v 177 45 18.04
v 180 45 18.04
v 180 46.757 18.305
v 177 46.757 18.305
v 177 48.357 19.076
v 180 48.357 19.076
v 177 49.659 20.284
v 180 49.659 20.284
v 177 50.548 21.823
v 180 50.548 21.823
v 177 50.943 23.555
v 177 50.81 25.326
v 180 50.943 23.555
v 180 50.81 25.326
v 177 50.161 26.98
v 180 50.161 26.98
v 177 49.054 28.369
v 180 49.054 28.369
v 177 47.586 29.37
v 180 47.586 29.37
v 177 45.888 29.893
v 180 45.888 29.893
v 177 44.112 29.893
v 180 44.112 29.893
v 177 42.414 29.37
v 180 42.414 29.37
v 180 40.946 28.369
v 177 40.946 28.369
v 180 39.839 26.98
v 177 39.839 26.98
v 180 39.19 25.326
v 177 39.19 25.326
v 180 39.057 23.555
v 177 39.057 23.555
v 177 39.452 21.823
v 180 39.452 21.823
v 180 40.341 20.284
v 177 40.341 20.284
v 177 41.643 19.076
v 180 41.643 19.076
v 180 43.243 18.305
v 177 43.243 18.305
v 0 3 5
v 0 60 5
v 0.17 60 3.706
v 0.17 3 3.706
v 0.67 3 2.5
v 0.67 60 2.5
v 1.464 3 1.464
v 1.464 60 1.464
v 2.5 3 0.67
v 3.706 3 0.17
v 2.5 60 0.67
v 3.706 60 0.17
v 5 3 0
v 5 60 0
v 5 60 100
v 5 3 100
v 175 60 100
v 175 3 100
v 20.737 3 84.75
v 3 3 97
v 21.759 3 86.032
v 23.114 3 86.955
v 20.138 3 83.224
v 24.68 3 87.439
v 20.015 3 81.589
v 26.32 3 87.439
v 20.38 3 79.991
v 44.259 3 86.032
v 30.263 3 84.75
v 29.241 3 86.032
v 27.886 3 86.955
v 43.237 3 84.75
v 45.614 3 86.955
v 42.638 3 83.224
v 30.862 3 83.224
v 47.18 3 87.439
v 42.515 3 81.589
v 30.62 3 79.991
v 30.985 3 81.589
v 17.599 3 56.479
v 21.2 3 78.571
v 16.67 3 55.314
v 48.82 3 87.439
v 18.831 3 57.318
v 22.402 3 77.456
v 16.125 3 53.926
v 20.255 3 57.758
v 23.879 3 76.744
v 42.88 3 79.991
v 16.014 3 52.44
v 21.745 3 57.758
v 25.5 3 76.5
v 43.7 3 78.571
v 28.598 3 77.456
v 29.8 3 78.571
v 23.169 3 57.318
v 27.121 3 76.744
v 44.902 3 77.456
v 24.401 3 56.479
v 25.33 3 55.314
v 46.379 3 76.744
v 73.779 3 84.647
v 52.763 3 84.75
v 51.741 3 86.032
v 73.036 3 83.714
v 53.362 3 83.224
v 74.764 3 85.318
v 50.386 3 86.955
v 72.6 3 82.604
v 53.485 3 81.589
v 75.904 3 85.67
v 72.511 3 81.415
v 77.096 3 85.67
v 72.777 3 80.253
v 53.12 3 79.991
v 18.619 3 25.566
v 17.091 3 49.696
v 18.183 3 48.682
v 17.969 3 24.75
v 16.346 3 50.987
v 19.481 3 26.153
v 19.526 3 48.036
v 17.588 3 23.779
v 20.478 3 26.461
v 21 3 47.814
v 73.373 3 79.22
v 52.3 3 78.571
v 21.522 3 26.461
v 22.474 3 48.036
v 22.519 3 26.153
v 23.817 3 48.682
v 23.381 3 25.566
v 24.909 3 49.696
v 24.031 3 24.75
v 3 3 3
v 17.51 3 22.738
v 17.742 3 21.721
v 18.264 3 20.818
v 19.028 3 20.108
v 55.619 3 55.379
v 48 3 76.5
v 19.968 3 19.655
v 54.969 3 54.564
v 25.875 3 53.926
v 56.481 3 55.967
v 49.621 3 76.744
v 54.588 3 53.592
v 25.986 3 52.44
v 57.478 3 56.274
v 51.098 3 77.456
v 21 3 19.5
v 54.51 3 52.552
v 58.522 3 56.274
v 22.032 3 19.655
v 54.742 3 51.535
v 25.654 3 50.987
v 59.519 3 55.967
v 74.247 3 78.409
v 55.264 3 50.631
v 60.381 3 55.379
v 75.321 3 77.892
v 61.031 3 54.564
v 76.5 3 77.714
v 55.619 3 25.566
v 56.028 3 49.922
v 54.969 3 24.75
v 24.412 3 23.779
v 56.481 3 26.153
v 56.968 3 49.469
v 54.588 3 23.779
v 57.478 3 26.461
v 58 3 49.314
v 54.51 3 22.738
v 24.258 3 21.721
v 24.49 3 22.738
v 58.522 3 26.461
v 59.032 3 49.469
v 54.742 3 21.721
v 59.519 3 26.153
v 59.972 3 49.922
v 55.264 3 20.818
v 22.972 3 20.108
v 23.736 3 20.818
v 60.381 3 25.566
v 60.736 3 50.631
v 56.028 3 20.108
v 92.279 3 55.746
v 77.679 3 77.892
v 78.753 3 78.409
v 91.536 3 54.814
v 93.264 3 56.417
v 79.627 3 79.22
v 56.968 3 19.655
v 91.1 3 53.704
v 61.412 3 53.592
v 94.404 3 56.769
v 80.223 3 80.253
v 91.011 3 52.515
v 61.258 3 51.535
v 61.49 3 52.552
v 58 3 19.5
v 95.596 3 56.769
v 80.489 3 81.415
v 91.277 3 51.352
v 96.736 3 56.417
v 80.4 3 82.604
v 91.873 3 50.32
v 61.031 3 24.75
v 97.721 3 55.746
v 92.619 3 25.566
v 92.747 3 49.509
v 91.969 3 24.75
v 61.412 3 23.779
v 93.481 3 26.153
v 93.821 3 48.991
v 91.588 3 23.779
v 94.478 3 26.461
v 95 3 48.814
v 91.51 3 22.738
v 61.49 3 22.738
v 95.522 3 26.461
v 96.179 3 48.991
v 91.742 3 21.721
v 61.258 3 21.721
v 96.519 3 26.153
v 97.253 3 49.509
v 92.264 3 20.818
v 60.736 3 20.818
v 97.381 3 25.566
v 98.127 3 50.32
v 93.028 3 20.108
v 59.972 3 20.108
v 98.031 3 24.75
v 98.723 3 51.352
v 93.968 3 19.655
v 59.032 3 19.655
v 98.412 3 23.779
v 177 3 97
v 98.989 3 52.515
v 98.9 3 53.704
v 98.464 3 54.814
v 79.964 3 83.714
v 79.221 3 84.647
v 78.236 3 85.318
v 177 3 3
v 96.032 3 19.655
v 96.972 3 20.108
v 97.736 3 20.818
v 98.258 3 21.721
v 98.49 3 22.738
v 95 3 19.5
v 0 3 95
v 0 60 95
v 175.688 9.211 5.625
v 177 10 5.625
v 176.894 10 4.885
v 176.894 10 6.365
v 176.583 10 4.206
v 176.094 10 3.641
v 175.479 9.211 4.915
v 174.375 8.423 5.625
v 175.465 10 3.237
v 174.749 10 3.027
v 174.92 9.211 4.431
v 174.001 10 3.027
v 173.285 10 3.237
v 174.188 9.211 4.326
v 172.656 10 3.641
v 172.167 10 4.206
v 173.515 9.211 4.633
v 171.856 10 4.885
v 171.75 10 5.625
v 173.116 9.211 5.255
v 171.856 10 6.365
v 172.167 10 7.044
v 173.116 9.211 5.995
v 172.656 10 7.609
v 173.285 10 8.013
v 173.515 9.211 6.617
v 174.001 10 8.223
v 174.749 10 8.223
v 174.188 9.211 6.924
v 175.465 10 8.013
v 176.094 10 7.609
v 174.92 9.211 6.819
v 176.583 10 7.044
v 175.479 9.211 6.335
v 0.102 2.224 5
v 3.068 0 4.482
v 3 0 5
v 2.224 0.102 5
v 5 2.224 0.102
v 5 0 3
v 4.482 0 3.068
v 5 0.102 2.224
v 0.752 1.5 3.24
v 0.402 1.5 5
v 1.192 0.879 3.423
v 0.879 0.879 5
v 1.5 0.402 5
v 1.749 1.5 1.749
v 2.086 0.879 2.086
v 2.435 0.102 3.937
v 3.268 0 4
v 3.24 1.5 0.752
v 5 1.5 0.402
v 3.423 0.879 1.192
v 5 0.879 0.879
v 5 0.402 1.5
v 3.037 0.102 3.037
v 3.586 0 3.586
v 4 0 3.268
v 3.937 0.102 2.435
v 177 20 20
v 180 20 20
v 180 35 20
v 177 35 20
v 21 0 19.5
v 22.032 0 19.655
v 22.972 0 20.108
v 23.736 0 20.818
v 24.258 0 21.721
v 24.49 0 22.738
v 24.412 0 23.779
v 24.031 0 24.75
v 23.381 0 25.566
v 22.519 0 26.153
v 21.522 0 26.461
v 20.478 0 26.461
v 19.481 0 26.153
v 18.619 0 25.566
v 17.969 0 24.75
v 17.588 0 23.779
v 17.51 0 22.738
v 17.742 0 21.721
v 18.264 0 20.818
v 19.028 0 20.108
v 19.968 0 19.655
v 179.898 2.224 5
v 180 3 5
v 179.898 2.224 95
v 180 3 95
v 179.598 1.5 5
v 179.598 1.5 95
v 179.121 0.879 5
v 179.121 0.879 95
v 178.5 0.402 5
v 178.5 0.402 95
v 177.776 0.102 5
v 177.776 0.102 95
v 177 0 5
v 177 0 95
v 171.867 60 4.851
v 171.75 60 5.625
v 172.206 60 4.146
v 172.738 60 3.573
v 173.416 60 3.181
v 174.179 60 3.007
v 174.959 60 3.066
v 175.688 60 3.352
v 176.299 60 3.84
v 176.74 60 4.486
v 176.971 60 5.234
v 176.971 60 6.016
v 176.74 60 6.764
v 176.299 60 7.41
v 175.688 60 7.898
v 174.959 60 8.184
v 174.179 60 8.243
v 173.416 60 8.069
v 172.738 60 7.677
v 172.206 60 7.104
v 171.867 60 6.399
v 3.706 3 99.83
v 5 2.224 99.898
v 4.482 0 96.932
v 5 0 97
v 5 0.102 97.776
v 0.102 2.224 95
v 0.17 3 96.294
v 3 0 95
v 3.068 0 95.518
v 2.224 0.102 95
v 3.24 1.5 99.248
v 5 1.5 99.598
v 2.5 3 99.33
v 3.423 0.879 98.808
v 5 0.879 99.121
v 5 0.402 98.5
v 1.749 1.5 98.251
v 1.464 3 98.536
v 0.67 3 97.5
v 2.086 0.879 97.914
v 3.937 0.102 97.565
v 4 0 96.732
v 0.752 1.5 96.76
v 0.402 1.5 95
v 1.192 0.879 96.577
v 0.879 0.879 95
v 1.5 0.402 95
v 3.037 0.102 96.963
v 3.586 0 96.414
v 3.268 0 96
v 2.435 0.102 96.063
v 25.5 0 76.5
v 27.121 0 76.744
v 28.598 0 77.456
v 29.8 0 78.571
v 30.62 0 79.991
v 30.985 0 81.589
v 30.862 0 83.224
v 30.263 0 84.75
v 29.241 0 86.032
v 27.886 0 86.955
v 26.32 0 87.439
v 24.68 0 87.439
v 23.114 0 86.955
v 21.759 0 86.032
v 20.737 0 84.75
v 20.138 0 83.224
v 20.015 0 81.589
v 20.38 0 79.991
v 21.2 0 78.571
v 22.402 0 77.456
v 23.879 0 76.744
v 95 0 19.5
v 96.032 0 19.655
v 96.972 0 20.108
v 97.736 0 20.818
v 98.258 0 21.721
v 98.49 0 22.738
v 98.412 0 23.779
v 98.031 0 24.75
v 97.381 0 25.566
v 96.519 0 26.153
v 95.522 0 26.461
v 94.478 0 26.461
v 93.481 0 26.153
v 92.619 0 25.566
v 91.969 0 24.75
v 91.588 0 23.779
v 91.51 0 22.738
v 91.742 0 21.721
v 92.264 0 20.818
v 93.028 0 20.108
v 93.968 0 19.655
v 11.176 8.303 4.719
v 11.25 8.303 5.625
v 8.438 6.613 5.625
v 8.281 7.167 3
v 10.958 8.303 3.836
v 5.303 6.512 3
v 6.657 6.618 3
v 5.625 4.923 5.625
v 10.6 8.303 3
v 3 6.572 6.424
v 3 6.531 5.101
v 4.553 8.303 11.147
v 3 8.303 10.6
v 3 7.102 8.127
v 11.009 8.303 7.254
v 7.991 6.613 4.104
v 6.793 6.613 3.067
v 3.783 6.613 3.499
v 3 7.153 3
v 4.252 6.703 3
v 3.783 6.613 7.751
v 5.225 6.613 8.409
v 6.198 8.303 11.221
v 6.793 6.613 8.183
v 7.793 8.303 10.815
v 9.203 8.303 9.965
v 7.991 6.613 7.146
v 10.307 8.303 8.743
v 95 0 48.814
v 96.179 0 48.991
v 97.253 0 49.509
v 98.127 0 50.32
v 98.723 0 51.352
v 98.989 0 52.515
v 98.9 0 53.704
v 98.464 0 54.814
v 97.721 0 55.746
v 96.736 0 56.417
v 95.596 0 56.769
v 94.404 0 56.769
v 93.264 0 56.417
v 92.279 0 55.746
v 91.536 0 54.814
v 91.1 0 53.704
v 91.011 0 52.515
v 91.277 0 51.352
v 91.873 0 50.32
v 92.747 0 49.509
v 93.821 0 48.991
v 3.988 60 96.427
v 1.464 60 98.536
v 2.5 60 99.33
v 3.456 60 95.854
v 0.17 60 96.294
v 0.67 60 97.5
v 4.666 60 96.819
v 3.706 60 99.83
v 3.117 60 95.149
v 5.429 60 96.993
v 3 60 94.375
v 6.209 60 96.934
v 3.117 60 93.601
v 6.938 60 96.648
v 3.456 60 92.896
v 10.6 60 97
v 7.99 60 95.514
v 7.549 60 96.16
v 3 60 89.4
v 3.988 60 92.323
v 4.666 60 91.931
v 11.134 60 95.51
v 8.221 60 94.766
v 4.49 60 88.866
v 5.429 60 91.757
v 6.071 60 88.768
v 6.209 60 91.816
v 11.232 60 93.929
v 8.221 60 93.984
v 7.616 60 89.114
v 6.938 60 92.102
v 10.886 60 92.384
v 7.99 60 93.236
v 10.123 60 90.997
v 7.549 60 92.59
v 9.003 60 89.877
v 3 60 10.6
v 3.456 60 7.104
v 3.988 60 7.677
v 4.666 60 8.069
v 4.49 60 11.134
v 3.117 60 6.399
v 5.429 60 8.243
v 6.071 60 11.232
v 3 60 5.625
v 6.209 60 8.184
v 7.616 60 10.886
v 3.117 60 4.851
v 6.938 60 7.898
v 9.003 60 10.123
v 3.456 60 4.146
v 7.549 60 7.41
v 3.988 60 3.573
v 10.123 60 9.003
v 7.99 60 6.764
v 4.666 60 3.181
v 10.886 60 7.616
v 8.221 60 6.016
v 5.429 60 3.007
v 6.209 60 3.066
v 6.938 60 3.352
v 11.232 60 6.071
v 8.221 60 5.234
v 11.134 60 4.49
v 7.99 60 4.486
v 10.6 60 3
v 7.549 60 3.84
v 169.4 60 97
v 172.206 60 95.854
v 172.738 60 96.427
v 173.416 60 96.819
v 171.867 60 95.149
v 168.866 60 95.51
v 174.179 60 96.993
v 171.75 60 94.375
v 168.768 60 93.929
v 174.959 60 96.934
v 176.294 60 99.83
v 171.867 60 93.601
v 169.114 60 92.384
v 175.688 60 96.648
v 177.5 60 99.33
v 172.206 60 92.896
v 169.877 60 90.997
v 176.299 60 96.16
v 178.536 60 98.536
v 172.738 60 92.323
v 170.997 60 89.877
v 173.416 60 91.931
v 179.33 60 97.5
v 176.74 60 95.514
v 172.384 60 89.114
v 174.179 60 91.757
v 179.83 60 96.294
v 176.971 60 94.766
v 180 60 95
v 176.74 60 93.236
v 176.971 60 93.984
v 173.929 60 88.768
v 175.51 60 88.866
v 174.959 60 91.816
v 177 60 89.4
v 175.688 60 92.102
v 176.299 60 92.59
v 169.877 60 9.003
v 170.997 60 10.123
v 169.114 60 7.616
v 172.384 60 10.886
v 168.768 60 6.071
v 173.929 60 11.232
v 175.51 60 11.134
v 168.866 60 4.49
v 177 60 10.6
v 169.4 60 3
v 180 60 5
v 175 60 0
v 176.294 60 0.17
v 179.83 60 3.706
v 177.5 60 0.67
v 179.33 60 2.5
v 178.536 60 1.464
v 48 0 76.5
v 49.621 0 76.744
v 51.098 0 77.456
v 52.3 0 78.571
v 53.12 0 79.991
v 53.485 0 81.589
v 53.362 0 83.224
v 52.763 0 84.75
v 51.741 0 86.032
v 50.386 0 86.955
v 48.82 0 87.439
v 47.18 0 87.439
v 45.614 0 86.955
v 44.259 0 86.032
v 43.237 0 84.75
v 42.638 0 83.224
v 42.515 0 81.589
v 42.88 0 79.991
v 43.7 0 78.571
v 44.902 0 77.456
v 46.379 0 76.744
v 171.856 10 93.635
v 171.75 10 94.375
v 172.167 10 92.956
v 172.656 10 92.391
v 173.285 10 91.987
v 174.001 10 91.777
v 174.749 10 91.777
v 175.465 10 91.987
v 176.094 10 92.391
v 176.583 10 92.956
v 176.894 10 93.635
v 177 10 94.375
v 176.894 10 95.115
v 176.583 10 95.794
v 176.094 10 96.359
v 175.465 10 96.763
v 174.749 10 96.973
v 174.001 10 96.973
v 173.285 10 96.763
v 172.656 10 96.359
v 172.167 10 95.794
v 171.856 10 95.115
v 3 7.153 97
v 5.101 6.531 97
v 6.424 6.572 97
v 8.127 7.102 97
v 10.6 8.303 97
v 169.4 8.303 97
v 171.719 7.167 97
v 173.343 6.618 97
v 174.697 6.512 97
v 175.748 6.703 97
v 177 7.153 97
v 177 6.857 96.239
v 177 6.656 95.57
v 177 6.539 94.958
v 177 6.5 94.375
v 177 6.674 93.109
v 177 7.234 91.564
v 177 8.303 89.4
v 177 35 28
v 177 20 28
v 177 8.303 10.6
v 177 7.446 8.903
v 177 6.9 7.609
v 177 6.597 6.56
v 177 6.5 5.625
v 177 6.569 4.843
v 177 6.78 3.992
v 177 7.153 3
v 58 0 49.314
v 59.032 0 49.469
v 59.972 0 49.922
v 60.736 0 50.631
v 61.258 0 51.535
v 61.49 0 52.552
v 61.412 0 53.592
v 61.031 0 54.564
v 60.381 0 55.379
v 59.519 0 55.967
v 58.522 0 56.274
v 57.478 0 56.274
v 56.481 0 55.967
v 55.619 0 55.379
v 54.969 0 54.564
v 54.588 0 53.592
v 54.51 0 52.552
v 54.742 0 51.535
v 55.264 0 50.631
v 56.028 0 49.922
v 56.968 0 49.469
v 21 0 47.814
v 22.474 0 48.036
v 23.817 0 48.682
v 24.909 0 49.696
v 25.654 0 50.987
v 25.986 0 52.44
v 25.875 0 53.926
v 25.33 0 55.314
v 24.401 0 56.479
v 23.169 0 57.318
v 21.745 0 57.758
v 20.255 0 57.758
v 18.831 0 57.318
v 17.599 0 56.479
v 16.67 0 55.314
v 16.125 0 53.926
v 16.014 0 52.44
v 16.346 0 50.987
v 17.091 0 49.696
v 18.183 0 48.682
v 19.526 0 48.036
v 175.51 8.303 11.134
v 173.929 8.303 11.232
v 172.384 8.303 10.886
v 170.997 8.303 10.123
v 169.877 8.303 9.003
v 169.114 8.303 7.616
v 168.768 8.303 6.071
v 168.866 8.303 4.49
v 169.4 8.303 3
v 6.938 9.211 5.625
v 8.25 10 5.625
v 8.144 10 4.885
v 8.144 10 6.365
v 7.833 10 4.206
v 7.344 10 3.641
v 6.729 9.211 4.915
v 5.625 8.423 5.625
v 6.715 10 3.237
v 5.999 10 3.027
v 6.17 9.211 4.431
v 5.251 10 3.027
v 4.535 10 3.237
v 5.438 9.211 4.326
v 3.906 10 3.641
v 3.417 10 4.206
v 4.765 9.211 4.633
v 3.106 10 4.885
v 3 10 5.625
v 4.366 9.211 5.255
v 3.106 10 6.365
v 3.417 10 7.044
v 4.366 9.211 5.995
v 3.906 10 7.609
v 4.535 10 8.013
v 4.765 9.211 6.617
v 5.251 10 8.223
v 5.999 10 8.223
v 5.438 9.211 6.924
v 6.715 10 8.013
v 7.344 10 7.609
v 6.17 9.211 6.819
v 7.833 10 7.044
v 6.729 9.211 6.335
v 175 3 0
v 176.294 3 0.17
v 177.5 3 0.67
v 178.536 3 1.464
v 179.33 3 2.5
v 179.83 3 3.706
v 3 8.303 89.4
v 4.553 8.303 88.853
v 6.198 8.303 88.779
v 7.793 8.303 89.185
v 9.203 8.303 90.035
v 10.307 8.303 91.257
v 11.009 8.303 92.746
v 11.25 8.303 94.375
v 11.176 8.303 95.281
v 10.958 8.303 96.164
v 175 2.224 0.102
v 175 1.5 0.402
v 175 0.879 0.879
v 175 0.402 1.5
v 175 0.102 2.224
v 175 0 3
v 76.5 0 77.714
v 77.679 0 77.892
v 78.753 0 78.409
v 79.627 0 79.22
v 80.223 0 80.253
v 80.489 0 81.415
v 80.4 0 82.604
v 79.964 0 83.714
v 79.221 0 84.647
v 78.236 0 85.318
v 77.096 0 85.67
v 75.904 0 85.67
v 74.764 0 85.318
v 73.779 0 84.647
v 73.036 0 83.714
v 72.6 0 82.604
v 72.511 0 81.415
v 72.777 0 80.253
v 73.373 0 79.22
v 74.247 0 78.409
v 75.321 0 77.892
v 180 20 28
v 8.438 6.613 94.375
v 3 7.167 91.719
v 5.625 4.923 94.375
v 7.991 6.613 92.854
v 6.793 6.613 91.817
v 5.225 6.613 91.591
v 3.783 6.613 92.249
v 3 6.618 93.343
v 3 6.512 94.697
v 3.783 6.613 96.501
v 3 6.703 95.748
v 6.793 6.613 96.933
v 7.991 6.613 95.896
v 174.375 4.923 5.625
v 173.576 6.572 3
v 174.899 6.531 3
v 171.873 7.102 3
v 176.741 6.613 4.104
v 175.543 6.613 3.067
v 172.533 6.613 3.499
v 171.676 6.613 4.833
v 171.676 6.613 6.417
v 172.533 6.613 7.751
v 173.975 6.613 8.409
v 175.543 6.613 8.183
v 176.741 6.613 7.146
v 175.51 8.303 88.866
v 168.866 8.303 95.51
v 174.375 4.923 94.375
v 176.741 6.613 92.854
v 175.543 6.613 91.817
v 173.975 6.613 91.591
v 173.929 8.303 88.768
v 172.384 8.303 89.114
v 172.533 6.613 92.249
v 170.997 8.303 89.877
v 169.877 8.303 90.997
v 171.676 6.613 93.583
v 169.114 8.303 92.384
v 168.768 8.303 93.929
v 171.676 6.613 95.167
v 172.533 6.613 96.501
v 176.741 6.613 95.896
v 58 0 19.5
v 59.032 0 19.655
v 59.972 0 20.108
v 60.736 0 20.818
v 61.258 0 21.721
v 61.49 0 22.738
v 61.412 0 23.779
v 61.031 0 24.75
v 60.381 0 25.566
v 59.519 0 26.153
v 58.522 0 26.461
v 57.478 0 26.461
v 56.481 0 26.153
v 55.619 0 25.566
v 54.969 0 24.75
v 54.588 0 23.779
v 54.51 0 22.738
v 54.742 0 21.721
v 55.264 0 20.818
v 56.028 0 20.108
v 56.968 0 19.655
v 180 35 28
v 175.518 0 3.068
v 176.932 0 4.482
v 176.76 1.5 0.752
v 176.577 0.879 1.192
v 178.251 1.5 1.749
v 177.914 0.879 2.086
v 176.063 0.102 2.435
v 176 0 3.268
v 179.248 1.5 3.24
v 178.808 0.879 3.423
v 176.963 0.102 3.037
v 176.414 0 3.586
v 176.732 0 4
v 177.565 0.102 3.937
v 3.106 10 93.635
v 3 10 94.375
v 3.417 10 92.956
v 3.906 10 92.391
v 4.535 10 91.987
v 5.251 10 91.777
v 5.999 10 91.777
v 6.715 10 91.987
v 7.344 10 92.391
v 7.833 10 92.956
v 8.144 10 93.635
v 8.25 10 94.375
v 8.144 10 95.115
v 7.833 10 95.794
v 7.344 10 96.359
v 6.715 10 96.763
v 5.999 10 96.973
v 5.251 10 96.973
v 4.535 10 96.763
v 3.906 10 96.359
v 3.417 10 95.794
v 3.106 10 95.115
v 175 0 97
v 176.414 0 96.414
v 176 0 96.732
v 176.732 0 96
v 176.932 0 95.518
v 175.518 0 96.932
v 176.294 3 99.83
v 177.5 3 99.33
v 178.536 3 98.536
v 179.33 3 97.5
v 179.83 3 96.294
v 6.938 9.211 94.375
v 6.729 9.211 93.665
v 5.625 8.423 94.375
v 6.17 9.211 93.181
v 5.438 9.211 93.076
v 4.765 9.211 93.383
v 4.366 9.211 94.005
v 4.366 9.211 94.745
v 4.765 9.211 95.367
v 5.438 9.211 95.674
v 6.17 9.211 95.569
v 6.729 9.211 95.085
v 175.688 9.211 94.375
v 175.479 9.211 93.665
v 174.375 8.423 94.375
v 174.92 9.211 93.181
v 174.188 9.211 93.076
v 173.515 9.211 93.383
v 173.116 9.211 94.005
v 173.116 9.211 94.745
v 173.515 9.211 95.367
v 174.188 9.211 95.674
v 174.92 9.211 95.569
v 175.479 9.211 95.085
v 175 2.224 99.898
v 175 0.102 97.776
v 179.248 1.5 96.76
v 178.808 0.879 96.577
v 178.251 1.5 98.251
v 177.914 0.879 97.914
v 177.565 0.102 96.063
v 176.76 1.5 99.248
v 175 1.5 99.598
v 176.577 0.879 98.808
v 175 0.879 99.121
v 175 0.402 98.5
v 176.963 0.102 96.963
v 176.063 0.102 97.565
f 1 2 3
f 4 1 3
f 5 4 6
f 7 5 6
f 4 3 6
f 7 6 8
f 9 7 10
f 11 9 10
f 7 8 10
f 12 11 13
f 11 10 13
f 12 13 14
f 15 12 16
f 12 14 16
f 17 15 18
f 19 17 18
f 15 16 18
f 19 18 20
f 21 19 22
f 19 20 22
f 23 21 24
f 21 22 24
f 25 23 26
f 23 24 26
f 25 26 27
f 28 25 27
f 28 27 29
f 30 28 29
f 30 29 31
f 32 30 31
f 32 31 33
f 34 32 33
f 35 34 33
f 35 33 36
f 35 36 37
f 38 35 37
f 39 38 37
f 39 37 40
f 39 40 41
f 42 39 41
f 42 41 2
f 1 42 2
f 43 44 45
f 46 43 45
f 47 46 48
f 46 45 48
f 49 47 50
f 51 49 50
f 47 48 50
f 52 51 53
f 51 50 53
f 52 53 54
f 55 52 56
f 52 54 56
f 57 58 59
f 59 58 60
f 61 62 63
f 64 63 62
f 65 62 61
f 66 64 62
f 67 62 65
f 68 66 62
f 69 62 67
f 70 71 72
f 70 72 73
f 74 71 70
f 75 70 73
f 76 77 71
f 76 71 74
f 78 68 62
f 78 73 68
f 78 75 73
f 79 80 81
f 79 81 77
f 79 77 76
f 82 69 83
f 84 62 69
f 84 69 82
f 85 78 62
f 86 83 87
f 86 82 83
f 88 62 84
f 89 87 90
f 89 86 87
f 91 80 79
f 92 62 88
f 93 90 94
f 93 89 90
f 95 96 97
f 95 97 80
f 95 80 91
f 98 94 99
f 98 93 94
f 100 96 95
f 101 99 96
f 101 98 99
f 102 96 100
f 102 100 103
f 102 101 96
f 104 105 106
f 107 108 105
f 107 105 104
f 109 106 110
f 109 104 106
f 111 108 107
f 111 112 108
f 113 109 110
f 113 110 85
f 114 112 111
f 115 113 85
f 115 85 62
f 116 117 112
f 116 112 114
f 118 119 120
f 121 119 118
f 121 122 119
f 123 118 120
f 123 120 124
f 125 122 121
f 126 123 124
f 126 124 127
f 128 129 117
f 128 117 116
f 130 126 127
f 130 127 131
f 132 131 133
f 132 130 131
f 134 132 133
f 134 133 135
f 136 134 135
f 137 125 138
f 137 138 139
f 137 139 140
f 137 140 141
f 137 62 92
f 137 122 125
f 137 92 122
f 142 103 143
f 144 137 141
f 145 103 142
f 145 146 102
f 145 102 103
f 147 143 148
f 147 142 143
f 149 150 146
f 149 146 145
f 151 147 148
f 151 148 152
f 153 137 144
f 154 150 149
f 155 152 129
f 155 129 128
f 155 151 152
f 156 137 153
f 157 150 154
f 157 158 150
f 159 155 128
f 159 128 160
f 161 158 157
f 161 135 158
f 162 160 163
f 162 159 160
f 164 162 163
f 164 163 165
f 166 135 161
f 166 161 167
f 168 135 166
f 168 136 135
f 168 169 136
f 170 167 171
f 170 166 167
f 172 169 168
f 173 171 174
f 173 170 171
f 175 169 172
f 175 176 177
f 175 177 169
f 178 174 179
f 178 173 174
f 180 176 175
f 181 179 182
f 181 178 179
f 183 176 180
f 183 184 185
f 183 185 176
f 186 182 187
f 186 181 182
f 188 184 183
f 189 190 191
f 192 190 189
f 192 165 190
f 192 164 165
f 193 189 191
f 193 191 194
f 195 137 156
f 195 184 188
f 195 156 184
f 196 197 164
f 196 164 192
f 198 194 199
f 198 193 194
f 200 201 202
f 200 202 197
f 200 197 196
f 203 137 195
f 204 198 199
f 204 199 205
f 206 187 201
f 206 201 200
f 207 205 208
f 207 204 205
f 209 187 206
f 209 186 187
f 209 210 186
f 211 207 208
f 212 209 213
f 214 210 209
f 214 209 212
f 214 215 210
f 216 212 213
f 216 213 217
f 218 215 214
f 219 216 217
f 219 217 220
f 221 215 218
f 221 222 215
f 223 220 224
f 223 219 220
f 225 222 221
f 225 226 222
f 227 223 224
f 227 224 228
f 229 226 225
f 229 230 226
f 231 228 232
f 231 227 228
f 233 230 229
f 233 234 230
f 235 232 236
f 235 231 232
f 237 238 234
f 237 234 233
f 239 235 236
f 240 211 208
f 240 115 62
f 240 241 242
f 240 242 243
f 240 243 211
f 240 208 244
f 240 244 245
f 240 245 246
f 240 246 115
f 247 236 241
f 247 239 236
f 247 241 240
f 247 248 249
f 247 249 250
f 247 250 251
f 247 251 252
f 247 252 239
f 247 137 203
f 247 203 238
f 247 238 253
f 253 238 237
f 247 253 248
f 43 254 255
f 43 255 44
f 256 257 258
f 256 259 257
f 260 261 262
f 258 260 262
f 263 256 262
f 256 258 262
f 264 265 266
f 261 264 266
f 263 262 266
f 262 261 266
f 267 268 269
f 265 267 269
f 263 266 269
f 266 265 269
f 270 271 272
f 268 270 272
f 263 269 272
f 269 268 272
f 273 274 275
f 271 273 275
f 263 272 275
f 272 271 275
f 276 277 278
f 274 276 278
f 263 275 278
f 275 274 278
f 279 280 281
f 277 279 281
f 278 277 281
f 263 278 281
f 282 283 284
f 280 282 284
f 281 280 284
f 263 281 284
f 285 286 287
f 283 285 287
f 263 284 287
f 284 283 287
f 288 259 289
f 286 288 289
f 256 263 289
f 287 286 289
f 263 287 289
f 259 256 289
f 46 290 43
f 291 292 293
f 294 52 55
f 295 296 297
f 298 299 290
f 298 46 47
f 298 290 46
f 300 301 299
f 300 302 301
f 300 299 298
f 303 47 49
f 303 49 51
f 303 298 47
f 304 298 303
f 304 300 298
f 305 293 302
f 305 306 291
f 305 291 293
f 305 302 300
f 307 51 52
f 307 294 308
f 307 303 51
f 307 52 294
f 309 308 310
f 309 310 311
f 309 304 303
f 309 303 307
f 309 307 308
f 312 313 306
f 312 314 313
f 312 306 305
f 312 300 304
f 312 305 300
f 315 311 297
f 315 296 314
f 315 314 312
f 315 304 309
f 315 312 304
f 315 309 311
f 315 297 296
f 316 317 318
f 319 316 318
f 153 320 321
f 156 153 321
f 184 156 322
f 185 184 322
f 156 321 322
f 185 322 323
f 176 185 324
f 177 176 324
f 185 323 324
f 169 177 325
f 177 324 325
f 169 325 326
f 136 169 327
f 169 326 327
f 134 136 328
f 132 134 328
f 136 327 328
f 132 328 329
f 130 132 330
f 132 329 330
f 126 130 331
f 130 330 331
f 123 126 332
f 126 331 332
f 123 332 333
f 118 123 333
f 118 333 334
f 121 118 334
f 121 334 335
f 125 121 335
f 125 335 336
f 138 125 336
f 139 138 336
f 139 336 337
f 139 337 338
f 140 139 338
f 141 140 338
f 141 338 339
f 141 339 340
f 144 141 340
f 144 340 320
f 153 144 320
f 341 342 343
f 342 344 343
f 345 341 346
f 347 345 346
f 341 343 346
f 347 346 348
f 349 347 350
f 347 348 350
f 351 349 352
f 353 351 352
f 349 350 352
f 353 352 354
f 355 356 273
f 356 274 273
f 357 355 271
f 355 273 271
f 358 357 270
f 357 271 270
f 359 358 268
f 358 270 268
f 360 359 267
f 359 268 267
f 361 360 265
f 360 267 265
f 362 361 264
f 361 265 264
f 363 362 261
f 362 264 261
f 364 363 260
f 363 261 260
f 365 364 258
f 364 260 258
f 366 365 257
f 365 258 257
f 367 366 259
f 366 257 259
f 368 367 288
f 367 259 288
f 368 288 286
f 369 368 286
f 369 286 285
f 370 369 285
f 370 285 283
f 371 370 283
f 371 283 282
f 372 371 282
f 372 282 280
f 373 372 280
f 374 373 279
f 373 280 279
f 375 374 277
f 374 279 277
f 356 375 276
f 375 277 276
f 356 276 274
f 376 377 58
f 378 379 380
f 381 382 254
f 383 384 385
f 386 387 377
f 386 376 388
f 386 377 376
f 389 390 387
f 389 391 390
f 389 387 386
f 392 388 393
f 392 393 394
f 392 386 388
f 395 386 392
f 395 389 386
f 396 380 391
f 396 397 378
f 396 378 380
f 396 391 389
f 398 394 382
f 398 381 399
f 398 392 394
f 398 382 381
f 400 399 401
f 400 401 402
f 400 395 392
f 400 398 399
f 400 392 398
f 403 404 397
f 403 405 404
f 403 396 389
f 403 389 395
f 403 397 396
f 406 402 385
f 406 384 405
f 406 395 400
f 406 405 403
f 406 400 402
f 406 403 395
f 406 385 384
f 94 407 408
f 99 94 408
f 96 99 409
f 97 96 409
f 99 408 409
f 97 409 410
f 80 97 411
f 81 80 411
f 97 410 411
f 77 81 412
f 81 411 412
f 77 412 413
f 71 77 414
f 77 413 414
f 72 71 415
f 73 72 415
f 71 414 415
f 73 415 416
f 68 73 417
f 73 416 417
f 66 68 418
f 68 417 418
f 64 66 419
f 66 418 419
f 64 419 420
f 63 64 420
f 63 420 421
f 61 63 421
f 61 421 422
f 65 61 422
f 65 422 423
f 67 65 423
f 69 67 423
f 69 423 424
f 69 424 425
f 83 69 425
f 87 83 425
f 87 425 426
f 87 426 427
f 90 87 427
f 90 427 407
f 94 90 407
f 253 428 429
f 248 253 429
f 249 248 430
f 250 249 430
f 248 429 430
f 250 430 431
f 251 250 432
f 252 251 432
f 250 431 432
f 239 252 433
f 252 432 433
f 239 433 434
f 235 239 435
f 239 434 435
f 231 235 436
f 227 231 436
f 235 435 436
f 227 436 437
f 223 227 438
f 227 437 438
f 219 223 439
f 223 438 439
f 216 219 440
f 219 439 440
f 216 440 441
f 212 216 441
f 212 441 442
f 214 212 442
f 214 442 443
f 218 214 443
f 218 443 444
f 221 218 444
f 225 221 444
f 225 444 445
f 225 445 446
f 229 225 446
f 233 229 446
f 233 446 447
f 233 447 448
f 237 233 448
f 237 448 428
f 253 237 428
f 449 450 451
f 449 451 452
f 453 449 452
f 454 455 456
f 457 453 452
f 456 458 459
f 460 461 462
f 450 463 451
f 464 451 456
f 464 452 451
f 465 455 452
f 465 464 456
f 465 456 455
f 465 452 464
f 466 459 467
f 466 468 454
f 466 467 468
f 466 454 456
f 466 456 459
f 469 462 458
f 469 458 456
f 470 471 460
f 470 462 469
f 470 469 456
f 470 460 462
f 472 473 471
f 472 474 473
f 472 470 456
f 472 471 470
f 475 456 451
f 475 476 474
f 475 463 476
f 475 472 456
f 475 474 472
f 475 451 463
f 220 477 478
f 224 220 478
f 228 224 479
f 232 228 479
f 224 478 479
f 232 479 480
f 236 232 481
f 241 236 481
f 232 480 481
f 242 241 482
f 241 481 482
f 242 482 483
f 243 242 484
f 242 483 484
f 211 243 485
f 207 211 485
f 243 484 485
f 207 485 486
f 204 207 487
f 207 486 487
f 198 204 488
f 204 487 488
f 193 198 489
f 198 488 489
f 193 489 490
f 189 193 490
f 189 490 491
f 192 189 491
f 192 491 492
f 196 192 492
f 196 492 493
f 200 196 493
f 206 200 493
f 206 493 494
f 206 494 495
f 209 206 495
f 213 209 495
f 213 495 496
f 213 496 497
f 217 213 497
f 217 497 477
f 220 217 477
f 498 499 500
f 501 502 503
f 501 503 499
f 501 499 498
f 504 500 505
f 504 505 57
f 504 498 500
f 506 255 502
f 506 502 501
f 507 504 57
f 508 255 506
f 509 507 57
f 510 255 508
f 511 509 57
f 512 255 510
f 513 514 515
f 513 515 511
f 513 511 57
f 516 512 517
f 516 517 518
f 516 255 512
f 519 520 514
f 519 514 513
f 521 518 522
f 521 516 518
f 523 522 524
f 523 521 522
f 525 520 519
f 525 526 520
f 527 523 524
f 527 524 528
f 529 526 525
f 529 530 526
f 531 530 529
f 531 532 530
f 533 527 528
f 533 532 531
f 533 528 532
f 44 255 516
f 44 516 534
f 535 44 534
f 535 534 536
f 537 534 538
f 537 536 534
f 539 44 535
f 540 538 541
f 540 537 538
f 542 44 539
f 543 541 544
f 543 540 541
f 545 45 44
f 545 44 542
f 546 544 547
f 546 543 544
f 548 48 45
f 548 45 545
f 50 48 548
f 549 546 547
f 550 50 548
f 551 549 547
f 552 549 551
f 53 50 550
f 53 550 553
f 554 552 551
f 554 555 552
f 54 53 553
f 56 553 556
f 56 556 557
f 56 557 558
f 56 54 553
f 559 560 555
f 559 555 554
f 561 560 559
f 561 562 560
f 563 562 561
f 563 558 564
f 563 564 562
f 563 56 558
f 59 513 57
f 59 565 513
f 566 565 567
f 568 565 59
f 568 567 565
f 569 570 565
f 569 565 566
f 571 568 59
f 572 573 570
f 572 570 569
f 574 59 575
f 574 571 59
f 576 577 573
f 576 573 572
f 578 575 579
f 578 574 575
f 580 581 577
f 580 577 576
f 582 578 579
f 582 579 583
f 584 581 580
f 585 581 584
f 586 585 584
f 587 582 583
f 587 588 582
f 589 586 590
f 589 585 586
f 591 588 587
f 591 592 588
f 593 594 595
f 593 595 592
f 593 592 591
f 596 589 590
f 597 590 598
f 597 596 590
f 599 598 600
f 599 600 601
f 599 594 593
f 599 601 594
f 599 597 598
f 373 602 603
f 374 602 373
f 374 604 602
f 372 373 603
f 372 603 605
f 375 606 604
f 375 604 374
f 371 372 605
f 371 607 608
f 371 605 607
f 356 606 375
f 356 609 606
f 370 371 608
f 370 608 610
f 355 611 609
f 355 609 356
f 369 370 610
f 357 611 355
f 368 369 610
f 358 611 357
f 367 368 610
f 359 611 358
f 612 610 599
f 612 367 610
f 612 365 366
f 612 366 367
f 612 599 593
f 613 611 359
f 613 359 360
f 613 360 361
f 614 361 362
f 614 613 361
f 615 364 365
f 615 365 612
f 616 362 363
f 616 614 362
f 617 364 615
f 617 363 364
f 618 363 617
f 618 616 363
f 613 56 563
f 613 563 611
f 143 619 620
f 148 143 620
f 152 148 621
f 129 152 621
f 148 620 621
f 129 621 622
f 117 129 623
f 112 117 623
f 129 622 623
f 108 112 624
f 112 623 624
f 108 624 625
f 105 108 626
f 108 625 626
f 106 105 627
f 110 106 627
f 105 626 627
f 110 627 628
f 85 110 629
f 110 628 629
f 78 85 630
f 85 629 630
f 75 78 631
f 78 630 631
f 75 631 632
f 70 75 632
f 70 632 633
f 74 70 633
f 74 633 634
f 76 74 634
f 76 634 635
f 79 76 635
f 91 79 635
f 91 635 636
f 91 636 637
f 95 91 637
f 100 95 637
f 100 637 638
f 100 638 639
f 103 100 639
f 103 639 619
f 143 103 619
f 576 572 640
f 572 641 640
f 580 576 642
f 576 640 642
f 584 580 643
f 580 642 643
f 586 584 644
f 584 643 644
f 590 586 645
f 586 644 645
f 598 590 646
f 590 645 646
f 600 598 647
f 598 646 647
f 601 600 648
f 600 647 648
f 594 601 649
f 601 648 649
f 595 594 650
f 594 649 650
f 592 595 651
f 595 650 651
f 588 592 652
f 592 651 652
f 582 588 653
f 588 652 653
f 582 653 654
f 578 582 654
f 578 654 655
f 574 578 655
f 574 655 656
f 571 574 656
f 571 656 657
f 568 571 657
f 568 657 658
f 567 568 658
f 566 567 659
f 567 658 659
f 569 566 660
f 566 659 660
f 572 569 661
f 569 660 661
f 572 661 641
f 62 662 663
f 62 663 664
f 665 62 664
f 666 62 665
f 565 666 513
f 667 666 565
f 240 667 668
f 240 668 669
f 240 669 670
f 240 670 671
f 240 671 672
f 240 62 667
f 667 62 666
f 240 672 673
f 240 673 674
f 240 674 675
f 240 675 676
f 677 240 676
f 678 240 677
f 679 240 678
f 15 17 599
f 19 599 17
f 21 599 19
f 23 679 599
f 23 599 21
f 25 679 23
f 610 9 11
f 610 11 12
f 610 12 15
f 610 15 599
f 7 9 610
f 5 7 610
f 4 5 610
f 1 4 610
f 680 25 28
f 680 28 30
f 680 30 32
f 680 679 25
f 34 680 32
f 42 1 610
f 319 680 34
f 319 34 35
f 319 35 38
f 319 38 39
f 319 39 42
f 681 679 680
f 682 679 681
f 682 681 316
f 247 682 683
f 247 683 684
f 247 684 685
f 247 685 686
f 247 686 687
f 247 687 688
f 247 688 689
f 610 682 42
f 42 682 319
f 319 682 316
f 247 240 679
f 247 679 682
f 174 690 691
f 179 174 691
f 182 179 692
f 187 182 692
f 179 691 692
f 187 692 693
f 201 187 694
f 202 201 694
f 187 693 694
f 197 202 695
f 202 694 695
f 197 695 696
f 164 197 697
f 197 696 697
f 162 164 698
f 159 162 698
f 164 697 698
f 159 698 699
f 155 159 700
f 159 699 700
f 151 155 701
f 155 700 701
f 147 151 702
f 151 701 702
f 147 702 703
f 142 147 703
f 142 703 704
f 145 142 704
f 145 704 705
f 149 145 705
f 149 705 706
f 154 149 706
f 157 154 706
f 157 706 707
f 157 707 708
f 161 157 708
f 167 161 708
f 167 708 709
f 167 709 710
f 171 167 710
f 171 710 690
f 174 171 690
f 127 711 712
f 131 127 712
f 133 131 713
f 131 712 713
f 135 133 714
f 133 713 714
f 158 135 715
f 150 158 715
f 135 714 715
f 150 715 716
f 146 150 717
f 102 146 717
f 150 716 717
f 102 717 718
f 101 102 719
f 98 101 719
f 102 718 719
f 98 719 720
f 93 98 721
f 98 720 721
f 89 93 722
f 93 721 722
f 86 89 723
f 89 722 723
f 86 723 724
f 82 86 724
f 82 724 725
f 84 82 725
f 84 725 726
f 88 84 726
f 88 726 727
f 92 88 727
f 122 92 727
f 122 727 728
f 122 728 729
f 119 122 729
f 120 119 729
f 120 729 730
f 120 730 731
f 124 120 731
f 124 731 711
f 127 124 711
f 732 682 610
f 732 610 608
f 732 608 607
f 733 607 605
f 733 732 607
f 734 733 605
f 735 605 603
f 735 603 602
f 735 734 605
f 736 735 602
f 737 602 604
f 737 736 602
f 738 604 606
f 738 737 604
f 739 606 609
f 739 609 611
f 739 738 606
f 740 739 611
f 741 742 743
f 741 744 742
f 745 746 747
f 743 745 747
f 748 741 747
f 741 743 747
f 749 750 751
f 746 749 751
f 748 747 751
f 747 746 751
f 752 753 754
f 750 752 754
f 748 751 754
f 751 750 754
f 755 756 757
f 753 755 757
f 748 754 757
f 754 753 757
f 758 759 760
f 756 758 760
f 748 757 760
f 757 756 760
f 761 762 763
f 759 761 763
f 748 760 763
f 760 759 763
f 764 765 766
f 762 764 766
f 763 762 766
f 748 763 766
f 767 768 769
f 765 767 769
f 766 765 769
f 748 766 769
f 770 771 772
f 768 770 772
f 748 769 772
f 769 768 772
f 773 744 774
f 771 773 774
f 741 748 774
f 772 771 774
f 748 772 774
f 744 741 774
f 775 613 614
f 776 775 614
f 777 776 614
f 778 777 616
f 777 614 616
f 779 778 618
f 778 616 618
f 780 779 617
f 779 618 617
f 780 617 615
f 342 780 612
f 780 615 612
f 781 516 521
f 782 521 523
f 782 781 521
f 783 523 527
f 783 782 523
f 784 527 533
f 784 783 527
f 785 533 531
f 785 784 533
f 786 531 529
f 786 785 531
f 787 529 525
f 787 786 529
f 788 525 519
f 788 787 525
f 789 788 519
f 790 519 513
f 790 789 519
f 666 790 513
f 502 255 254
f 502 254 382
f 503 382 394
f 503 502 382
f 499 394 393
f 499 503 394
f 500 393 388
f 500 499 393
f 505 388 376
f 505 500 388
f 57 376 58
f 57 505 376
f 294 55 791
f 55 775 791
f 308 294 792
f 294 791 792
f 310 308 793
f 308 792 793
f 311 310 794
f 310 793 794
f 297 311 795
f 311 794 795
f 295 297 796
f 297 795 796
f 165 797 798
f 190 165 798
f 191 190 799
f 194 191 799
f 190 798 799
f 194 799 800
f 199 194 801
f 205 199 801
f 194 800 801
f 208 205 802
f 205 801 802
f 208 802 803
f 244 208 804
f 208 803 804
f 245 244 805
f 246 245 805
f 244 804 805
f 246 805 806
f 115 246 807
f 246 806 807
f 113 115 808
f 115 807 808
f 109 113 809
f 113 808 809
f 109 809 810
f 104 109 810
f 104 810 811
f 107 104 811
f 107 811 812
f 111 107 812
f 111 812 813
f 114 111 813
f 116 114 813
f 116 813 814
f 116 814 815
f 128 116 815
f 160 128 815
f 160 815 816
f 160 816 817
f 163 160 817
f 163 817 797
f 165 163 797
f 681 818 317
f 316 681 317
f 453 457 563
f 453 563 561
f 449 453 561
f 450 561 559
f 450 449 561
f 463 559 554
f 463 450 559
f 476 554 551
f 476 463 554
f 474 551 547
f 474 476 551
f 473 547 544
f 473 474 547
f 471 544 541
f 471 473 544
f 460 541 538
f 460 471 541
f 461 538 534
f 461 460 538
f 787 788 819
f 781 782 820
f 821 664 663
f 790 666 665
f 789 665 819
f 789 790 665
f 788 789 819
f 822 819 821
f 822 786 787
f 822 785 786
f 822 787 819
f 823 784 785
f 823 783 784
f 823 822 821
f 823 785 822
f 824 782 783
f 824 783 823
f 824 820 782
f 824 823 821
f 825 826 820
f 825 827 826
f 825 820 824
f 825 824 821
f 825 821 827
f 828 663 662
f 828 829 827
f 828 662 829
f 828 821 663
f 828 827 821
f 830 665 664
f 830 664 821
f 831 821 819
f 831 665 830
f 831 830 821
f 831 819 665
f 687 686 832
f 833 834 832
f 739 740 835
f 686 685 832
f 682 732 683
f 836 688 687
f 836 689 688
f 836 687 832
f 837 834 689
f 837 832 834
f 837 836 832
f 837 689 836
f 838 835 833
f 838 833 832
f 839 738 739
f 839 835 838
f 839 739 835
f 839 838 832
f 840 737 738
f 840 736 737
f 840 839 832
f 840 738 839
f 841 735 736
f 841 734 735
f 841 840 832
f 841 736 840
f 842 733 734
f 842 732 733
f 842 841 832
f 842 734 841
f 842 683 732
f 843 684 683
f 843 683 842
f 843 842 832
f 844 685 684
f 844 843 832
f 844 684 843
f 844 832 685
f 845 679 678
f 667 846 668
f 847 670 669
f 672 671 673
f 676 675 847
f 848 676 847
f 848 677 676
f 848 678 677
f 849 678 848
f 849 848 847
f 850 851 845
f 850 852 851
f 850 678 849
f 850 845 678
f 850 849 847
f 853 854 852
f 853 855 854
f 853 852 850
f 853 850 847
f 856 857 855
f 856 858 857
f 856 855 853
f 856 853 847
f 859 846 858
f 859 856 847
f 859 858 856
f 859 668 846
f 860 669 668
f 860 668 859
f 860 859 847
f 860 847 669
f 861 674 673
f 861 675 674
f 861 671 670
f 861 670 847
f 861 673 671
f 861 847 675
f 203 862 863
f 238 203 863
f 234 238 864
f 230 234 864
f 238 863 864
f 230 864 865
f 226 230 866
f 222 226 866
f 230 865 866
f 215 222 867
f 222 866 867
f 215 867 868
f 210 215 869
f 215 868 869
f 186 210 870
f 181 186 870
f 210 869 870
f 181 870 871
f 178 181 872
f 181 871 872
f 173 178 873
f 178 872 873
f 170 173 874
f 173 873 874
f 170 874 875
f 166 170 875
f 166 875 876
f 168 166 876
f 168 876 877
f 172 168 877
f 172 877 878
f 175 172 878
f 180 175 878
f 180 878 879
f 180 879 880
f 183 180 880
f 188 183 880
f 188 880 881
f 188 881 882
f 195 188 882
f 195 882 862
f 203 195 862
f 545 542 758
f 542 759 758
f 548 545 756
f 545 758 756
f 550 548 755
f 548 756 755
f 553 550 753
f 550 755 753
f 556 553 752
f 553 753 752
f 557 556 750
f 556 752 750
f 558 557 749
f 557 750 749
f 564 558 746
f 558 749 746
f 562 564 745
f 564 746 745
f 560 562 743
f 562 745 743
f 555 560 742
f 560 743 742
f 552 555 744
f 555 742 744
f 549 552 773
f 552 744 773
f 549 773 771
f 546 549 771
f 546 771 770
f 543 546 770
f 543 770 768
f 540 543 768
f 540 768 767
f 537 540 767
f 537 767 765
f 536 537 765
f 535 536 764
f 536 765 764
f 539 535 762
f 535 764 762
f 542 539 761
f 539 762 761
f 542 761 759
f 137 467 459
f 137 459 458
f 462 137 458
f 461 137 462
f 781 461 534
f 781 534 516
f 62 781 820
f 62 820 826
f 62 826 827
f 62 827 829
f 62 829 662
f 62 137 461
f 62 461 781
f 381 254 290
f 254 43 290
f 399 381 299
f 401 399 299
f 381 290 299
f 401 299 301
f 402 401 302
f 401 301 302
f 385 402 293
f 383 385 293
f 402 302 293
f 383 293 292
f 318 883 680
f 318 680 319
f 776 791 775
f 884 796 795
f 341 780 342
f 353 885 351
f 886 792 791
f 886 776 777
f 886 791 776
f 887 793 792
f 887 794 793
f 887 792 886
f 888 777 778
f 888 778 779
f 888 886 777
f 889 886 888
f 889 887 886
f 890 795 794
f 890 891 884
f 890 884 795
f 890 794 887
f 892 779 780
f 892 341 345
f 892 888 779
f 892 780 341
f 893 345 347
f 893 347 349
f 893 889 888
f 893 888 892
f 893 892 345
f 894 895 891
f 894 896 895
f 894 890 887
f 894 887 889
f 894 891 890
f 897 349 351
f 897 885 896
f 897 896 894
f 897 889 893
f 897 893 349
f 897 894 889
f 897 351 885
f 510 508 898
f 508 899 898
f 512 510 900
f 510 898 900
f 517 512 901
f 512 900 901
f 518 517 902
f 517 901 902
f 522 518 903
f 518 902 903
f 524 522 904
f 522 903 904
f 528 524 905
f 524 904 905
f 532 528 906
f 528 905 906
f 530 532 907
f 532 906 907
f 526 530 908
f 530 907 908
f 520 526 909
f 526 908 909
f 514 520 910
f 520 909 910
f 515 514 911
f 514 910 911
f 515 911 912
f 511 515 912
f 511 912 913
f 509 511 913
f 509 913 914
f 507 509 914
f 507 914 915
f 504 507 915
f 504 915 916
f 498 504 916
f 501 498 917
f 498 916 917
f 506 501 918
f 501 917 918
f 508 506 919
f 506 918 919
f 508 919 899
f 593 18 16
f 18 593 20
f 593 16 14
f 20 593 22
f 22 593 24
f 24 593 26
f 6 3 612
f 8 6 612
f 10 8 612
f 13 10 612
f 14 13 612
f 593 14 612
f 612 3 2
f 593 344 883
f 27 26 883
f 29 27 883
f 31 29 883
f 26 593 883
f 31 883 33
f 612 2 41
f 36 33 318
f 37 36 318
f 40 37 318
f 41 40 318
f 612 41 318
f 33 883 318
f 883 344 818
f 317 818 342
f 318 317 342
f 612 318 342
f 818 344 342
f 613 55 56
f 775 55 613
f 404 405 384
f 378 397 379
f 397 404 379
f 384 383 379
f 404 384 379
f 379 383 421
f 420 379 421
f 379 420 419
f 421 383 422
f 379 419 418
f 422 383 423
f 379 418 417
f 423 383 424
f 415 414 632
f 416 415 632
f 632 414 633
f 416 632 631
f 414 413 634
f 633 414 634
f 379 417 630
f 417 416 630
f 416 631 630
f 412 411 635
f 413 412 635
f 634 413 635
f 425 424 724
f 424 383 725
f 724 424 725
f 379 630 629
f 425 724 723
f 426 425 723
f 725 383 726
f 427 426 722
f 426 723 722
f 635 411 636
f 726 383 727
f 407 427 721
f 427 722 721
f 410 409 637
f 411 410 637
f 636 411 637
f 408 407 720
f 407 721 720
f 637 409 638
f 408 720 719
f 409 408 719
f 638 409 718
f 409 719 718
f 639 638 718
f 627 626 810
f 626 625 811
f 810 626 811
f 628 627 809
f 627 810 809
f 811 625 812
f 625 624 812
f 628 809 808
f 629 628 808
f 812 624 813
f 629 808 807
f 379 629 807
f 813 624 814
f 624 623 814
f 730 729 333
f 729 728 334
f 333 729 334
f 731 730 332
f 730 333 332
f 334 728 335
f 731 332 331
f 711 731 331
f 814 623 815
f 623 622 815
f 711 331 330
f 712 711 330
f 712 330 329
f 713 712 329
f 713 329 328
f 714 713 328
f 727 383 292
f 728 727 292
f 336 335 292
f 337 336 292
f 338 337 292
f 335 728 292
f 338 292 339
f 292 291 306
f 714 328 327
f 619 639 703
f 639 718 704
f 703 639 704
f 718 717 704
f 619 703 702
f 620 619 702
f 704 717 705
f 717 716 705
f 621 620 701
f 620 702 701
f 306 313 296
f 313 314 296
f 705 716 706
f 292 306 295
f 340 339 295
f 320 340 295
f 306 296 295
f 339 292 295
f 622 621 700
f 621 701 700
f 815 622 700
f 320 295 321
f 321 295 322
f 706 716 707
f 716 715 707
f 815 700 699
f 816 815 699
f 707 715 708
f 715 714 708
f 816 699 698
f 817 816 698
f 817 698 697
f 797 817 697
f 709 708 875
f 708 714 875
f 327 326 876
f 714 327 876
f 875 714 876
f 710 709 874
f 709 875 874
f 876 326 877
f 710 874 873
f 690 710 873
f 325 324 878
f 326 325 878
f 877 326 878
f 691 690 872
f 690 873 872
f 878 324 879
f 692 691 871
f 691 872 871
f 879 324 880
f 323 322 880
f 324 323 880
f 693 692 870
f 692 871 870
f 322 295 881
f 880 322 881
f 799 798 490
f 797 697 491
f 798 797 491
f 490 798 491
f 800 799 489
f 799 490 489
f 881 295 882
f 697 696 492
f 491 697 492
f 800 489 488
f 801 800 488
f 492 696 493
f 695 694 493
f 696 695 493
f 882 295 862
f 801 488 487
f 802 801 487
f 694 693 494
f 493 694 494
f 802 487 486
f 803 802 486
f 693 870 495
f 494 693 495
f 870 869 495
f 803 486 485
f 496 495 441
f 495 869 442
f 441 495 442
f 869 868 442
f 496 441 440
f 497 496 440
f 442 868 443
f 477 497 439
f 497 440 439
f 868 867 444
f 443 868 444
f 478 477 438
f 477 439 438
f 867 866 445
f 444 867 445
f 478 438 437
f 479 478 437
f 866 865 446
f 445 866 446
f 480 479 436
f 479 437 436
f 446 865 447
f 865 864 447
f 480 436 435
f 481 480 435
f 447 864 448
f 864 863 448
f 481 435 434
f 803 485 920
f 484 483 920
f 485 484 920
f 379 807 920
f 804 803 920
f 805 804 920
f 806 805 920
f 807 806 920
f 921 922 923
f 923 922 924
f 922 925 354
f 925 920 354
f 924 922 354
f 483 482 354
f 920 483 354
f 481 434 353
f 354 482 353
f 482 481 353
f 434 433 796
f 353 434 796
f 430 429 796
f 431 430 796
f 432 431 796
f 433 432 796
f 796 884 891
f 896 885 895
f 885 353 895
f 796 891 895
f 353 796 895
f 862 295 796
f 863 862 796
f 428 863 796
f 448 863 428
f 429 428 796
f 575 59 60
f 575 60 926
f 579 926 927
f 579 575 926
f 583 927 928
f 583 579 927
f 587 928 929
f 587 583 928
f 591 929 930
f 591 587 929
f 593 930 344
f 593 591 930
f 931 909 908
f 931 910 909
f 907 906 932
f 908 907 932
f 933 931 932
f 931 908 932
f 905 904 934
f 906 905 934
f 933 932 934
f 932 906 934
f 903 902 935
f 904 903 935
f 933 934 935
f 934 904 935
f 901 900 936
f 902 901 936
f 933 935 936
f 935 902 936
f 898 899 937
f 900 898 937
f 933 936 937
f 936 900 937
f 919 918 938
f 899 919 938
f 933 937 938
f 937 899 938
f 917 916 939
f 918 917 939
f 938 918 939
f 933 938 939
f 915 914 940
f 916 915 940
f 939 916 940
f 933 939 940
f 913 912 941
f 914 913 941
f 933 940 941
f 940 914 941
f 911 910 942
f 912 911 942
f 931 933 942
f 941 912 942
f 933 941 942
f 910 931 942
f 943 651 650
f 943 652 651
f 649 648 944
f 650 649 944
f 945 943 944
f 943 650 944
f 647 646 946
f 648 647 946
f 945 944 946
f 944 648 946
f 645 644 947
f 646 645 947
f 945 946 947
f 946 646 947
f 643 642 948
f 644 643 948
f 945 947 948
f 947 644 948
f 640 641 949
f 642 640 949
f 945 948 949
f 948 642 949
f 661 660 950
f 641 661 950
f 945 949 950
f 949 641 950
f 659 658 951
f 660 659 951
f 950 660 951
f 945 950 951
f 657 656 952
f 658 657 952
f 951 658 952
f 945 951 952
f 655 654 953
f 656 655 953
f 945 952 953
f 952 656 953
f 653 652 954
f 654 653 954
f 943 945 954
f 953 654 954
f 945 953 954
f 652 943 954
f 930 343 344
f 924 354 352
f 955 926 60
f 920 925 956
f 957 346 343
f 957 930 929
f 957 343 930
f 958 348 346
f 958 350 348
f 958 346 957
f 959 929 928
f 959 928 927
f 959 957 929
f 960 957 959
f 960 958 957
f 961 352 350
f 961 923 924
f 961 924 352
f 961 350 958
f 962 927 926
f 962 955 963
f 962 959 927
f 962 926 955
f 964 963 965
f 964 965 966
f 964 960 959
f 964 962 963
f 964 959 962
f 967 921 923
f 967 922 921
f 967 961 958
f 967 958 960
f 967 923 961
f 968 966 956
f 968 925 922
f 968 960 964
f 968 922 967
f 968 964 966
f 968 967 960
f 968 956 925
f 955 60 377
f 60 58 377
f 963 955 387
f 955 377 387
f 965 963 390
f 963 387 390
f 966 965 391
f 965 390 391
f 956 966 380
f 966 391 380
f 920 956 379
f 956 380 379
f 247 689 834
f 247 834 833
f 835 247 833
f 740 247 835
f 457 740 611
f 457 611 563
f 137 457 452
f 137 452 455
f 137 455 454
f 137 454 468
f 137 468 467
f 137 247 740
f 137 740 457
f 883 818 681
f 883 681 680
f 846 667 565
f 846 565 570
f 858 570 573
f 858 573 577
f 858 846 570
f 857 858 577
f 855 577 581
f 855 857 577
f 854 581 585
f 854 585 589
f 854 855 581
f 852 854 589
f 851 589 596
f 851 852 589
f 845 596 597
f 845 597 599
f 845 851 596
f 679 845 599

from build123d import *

# Parameters (mm, degrees)
SKETCH1_W                 = 180
SKETCH1_H                 = 100
BOSS_EXTRUDE1_DEPTH       = 60
F_3_0MM_DOWEL_HOLE1_D     = 5.25
F_3_0MM_DOWEL_HOLE1_DEPTH = 50
F_3_0MM_DOWEL_HOLE1_TIP   = 1.577259125
SHELL2_START              = 3
SHELL2_DEPTH              = 57
SHELL2_2_DEPTH            = 5.302681665
FILLET1_R                 = 5
FILLET2_R                 = 3
SKETCH4_R                 = 5.959707521
SKETCH4_W                 = 8
SKETCH4_H                 = 15
CUT_EXTRUDE1_DEPTH        = 10
SKETCH6_R                 = 5.5
CUT_EXTRUDE2_DEPTH        = 10
SKETCH9_R                 = 3.5
SKETCH9_R_2               = 5
SKETCH9_R_3               = 4
CUT_EXTRUDE3_DEPTH        = 7
SKETCH10_R                = 4
CUT_EXTRUDE4_DEPTH        = 10


with BuildPart() as part:
    # Sketch1 → Boss-Extrude1 (new body)
    with BuildSketch(Plane(origin=(0, 0, 0), x_dir=(1, 0, 0), z_dir=(0, 1, 0))):
        with Locations((90, -50)):
            Rectangle(SKETCH1_W, SKETCH1_H)
    extrude(amount=BOSS_EXTRUDE1_DEPTH)

    # Ø3.0mm Dowel Hole1
    with Locations(Plane(origin=(0, 60, 0), x_dir=(1, 0, 0), z_dir=(0, 1, 0))):
        with Locations((5.625, -5.625), (174.375, -5.625), (5.625, -94.375), (174.375, -94.375)):
            Hole(F_3_0MM_DOWEL_HOLE1_D / 2, depth=F_3_0MM_DOWEL_HOLE1_DEPTH)
            with Locations((0, 0, -(F_3_0MM_DOWEL_HOLE1_DEPTH + F_3_0MM_DOWEL_HOLE1_TIP / 2))):  # 118° drill point
                Cone(0, F_3_0MM_DOWEL_HOLE1_D / 2, F_3_0MM_DOWEL_HOLE1_TIP, mode=Mode.SUBTRACT)

    # Shell2: read off the stored shape, not the designer's step
    # Shell2 outline → Shell2 (cut)
    with BuildSketch(Plane(origin=(0, 0, 0), x_dir=(1, 0, 0), z_dir=(0, 1, 0)).offset(SHELL2_START)):
        with BuildLine():
            Line((169.400062814, -3), (10.599937186, -3))
            ThreePointArc((10.599937186, -3), (9.602475644, -9.602475644), (3, -10.599937186))
            Line((3, -10.599937186), (3, -89.400062814))
            ThreePointArc((3, -89.400062814), (9.602475644, -90.397524356), (10.599937186, -97))
            Line((10.599937186, -97), (169.400062814, -97))
            ThreePointArc((169.400062814, -97), (170.397524356, -90.397524356), (177, -89.400062814))
            Line((177, -89.400062814), (177, -10.599937186))
            ThreePointArc((177, -10.599937186), (170.397524356, -9.602475644), (169.400062814, -3))
        make_face()
    extrude(amount=SHELL2_DEPTH, mode=Mode.SUBTRACT)

    # Shell2 2 outline → Shell2 2 (cut)
    with BuildSketch(Plane(origin=(0, 0, 0), x_dir=(1, 0, 0), z_dir=(0, 1, 0)).offset(SHELL2_START)):
        with BuildLine():
            Line((10.599937186, -3), (3, -3))
            Line((3, -3), (3, -10.599937186))
            ThreePointArc((3, -10.599937186), (9.602475644, -9.602475644), (10.599937186, -3))
        make_face()
        with BuildLine():
            Line((177, -3), (169.400062814, -3))
            ThreePointArc((169.400062814, -3), (170.397524356, -9.602475644), (177, -10.599937186))
            Line((177, -10.599937186), (177, -3))
        make_face()
        with BuildLine():
            ThreePointArc((10.599937186, -97), (9.602475644, -90.397524356), (3, -89.400062814))
            Line((3, -89.400062814), (3, -97))
            Line((3, -97), (10.599937186, -97))
        make_face()
        with BuildLine():
            Line((177, -97), (177, -89.400062814))
            ThreePointArc((177, -89.400062814), (170.397524356, -90.397524356), (169.400062814, -97))
            Line((169.400062814, -97), (177, -97))
        make_face()
    extrude(amount=SHELL2_2_DEPTH, mode=Mode.SUBTRACT)

    # Shell2 3 outline → Shell2 3 (revolve)
    with BuildSketch(Plane(origin=(5.625, 0, 94.375), x_dir=(1, 0, 0), z_dir=(0, 0, 1))):
        Polygon((0, 8.302681673), (0, 4.922840683), (5.625000013, 8.302681673), align=None)
    revolve(axis=Axis((5.625, 0, 94.375), (0, 1, 0)))

    # Shell2 4 outline → Shell2 4 (revolve)
    with BuildSketch(Plane(origin=(174.375, 0, 94.375), x_dir=(1, 0, 0), z_dir=(0, 0, 1))):
        Polygon((0, 8.302681665), (0, 4.922840683), (5.625, 8.302681665), align=None)
    revolve(axis=Axis((174.375, 0, 94.375), (0, 1, 0)))

    # Shell2 5 outline → Shell2 5 (revolve)
    with BuildSketch(Plane(origin=(174.375, 0, 5.625), x_dir=(1, 0, 0), z_dir=(0, 0, 1))):
        Polygon((0, 8.302681673), (0, 4.922840683), (5.625000013, 8.302681673), align=None)
    revolve(axis=Axis((174.375, 0, 5.625), (0, 1, 0)))

    # Shell2 6 outline → Shell2 6 (revolve)
    with BuildSketch(Plane(origin=(5.625, 0, 5.625), x_dir=(1, 0, 0), z_dir=(0, 0, 1))):
        Polygon((0, 8.302681673), (0, 4.922840683), (5.625000013, 8.302681673), align=None)
    revolve(axis=Axis((5.625, 0, 5.625), (0, 1, 0)))

    # Fillet1
    fillet1_edges = [part.edges().sort_by_distance(p)[0] for p in [
        (0, 30, 0),
        (180, 30, 0),
        (180, 30, 100),
        (0, 30, 100),
    ]]
    fillet(fillet1_edges, radius=FILLET1_R)

    # Fillet2
    fillet2_edges = [part.edges().sort_by_distance(p)[0] for p in [
        (0, 0, 50),
        (90, 0, 0),
        (180, 0, 50),
        (90, 0, 100),
        (1.464466094, 0, 98.535533906),
        (178.535533906, 0, 98.535533906),
        (178.535533906, 0, 1.464466094),
        (1.464466094, 0, 1.464466094),
    ]]
    fillet(fillet2_edges, radius=FILLET2_R)

    # Sketch4 → Cut-Extrude1 (cut)
    with BuildSketch(Plane(origin=(180, 0, 0), x_dir=(0, 0, -1), z_dir=(1, 0, 0))):
        with Locations((-24, 45)):
            Circle(SKETCH4_R)
        with Locations((-24, 27.5)):
            Rectangle(SKETCH4_W, SKETCH4_H)
    extrude(amount=-CUT_EXTRUDE1_DEPTH, mode=Mode.SUBTRACT)

    # Sketch6 → Cut-Extrude2 (cut)
    with BuildSketch(Plane.XZ):
        with Locations(Location((25.5, 82, 0), (0, 0, 270))):
            Circle(SKETCH6_R)
        with Locations(Location((48, 82, 0), (0, 0, 270))):
            Circle(SKETCH6_R)
    extrude(amount=-CUT_EXTRUDE2_DEPTH, mode=Mode.SUBTRACT)

    # Sketch9 → Cut-Extrude3 (cut)
    with BuildSketch(Plane.XZ):
        with Locations(Location((21, 23, 0), (0, 0, 270))):
            Circle(SKETCH9_R)
        with Locations(Location((58, 23, 0), (0, 0, 270))):
            Circle(SKETCH9_R)
        with Locations(Location((95, 23, 0), (0, 0, 270))):
            Circle(SKETCH9_R)
        with Locations(Location((21, 52.813509344, 0), (0, 0, 270))):
            Circle(SKETCH9_R_2)
        with Locations(Location((58, 52.813509344, 0), (0, 0, 270))):
            Circle(SKETCH9_R)
        with Locations(Location((95, 52.813509344, 0), (0, 0, 270))):
            Circle(SKETCH9_R_3)
    extrude(amount=-CUT_EXTRUDE3_DEPTH, mode=Mode.SUBTRACT)

    # Sketch10 → Cut-Extrude4 (cut)
    with BuildSketch(Plane.XZ):
        with Locations(Location((76.5, 81.714376639, 0), (0, 0, 270))):
            Circle(SKETCH10_R)
    extrude(amount=-CUT_EXTRUDE4_DEPTH, mode=Mode.SUBTRACT)


solid = part.part
